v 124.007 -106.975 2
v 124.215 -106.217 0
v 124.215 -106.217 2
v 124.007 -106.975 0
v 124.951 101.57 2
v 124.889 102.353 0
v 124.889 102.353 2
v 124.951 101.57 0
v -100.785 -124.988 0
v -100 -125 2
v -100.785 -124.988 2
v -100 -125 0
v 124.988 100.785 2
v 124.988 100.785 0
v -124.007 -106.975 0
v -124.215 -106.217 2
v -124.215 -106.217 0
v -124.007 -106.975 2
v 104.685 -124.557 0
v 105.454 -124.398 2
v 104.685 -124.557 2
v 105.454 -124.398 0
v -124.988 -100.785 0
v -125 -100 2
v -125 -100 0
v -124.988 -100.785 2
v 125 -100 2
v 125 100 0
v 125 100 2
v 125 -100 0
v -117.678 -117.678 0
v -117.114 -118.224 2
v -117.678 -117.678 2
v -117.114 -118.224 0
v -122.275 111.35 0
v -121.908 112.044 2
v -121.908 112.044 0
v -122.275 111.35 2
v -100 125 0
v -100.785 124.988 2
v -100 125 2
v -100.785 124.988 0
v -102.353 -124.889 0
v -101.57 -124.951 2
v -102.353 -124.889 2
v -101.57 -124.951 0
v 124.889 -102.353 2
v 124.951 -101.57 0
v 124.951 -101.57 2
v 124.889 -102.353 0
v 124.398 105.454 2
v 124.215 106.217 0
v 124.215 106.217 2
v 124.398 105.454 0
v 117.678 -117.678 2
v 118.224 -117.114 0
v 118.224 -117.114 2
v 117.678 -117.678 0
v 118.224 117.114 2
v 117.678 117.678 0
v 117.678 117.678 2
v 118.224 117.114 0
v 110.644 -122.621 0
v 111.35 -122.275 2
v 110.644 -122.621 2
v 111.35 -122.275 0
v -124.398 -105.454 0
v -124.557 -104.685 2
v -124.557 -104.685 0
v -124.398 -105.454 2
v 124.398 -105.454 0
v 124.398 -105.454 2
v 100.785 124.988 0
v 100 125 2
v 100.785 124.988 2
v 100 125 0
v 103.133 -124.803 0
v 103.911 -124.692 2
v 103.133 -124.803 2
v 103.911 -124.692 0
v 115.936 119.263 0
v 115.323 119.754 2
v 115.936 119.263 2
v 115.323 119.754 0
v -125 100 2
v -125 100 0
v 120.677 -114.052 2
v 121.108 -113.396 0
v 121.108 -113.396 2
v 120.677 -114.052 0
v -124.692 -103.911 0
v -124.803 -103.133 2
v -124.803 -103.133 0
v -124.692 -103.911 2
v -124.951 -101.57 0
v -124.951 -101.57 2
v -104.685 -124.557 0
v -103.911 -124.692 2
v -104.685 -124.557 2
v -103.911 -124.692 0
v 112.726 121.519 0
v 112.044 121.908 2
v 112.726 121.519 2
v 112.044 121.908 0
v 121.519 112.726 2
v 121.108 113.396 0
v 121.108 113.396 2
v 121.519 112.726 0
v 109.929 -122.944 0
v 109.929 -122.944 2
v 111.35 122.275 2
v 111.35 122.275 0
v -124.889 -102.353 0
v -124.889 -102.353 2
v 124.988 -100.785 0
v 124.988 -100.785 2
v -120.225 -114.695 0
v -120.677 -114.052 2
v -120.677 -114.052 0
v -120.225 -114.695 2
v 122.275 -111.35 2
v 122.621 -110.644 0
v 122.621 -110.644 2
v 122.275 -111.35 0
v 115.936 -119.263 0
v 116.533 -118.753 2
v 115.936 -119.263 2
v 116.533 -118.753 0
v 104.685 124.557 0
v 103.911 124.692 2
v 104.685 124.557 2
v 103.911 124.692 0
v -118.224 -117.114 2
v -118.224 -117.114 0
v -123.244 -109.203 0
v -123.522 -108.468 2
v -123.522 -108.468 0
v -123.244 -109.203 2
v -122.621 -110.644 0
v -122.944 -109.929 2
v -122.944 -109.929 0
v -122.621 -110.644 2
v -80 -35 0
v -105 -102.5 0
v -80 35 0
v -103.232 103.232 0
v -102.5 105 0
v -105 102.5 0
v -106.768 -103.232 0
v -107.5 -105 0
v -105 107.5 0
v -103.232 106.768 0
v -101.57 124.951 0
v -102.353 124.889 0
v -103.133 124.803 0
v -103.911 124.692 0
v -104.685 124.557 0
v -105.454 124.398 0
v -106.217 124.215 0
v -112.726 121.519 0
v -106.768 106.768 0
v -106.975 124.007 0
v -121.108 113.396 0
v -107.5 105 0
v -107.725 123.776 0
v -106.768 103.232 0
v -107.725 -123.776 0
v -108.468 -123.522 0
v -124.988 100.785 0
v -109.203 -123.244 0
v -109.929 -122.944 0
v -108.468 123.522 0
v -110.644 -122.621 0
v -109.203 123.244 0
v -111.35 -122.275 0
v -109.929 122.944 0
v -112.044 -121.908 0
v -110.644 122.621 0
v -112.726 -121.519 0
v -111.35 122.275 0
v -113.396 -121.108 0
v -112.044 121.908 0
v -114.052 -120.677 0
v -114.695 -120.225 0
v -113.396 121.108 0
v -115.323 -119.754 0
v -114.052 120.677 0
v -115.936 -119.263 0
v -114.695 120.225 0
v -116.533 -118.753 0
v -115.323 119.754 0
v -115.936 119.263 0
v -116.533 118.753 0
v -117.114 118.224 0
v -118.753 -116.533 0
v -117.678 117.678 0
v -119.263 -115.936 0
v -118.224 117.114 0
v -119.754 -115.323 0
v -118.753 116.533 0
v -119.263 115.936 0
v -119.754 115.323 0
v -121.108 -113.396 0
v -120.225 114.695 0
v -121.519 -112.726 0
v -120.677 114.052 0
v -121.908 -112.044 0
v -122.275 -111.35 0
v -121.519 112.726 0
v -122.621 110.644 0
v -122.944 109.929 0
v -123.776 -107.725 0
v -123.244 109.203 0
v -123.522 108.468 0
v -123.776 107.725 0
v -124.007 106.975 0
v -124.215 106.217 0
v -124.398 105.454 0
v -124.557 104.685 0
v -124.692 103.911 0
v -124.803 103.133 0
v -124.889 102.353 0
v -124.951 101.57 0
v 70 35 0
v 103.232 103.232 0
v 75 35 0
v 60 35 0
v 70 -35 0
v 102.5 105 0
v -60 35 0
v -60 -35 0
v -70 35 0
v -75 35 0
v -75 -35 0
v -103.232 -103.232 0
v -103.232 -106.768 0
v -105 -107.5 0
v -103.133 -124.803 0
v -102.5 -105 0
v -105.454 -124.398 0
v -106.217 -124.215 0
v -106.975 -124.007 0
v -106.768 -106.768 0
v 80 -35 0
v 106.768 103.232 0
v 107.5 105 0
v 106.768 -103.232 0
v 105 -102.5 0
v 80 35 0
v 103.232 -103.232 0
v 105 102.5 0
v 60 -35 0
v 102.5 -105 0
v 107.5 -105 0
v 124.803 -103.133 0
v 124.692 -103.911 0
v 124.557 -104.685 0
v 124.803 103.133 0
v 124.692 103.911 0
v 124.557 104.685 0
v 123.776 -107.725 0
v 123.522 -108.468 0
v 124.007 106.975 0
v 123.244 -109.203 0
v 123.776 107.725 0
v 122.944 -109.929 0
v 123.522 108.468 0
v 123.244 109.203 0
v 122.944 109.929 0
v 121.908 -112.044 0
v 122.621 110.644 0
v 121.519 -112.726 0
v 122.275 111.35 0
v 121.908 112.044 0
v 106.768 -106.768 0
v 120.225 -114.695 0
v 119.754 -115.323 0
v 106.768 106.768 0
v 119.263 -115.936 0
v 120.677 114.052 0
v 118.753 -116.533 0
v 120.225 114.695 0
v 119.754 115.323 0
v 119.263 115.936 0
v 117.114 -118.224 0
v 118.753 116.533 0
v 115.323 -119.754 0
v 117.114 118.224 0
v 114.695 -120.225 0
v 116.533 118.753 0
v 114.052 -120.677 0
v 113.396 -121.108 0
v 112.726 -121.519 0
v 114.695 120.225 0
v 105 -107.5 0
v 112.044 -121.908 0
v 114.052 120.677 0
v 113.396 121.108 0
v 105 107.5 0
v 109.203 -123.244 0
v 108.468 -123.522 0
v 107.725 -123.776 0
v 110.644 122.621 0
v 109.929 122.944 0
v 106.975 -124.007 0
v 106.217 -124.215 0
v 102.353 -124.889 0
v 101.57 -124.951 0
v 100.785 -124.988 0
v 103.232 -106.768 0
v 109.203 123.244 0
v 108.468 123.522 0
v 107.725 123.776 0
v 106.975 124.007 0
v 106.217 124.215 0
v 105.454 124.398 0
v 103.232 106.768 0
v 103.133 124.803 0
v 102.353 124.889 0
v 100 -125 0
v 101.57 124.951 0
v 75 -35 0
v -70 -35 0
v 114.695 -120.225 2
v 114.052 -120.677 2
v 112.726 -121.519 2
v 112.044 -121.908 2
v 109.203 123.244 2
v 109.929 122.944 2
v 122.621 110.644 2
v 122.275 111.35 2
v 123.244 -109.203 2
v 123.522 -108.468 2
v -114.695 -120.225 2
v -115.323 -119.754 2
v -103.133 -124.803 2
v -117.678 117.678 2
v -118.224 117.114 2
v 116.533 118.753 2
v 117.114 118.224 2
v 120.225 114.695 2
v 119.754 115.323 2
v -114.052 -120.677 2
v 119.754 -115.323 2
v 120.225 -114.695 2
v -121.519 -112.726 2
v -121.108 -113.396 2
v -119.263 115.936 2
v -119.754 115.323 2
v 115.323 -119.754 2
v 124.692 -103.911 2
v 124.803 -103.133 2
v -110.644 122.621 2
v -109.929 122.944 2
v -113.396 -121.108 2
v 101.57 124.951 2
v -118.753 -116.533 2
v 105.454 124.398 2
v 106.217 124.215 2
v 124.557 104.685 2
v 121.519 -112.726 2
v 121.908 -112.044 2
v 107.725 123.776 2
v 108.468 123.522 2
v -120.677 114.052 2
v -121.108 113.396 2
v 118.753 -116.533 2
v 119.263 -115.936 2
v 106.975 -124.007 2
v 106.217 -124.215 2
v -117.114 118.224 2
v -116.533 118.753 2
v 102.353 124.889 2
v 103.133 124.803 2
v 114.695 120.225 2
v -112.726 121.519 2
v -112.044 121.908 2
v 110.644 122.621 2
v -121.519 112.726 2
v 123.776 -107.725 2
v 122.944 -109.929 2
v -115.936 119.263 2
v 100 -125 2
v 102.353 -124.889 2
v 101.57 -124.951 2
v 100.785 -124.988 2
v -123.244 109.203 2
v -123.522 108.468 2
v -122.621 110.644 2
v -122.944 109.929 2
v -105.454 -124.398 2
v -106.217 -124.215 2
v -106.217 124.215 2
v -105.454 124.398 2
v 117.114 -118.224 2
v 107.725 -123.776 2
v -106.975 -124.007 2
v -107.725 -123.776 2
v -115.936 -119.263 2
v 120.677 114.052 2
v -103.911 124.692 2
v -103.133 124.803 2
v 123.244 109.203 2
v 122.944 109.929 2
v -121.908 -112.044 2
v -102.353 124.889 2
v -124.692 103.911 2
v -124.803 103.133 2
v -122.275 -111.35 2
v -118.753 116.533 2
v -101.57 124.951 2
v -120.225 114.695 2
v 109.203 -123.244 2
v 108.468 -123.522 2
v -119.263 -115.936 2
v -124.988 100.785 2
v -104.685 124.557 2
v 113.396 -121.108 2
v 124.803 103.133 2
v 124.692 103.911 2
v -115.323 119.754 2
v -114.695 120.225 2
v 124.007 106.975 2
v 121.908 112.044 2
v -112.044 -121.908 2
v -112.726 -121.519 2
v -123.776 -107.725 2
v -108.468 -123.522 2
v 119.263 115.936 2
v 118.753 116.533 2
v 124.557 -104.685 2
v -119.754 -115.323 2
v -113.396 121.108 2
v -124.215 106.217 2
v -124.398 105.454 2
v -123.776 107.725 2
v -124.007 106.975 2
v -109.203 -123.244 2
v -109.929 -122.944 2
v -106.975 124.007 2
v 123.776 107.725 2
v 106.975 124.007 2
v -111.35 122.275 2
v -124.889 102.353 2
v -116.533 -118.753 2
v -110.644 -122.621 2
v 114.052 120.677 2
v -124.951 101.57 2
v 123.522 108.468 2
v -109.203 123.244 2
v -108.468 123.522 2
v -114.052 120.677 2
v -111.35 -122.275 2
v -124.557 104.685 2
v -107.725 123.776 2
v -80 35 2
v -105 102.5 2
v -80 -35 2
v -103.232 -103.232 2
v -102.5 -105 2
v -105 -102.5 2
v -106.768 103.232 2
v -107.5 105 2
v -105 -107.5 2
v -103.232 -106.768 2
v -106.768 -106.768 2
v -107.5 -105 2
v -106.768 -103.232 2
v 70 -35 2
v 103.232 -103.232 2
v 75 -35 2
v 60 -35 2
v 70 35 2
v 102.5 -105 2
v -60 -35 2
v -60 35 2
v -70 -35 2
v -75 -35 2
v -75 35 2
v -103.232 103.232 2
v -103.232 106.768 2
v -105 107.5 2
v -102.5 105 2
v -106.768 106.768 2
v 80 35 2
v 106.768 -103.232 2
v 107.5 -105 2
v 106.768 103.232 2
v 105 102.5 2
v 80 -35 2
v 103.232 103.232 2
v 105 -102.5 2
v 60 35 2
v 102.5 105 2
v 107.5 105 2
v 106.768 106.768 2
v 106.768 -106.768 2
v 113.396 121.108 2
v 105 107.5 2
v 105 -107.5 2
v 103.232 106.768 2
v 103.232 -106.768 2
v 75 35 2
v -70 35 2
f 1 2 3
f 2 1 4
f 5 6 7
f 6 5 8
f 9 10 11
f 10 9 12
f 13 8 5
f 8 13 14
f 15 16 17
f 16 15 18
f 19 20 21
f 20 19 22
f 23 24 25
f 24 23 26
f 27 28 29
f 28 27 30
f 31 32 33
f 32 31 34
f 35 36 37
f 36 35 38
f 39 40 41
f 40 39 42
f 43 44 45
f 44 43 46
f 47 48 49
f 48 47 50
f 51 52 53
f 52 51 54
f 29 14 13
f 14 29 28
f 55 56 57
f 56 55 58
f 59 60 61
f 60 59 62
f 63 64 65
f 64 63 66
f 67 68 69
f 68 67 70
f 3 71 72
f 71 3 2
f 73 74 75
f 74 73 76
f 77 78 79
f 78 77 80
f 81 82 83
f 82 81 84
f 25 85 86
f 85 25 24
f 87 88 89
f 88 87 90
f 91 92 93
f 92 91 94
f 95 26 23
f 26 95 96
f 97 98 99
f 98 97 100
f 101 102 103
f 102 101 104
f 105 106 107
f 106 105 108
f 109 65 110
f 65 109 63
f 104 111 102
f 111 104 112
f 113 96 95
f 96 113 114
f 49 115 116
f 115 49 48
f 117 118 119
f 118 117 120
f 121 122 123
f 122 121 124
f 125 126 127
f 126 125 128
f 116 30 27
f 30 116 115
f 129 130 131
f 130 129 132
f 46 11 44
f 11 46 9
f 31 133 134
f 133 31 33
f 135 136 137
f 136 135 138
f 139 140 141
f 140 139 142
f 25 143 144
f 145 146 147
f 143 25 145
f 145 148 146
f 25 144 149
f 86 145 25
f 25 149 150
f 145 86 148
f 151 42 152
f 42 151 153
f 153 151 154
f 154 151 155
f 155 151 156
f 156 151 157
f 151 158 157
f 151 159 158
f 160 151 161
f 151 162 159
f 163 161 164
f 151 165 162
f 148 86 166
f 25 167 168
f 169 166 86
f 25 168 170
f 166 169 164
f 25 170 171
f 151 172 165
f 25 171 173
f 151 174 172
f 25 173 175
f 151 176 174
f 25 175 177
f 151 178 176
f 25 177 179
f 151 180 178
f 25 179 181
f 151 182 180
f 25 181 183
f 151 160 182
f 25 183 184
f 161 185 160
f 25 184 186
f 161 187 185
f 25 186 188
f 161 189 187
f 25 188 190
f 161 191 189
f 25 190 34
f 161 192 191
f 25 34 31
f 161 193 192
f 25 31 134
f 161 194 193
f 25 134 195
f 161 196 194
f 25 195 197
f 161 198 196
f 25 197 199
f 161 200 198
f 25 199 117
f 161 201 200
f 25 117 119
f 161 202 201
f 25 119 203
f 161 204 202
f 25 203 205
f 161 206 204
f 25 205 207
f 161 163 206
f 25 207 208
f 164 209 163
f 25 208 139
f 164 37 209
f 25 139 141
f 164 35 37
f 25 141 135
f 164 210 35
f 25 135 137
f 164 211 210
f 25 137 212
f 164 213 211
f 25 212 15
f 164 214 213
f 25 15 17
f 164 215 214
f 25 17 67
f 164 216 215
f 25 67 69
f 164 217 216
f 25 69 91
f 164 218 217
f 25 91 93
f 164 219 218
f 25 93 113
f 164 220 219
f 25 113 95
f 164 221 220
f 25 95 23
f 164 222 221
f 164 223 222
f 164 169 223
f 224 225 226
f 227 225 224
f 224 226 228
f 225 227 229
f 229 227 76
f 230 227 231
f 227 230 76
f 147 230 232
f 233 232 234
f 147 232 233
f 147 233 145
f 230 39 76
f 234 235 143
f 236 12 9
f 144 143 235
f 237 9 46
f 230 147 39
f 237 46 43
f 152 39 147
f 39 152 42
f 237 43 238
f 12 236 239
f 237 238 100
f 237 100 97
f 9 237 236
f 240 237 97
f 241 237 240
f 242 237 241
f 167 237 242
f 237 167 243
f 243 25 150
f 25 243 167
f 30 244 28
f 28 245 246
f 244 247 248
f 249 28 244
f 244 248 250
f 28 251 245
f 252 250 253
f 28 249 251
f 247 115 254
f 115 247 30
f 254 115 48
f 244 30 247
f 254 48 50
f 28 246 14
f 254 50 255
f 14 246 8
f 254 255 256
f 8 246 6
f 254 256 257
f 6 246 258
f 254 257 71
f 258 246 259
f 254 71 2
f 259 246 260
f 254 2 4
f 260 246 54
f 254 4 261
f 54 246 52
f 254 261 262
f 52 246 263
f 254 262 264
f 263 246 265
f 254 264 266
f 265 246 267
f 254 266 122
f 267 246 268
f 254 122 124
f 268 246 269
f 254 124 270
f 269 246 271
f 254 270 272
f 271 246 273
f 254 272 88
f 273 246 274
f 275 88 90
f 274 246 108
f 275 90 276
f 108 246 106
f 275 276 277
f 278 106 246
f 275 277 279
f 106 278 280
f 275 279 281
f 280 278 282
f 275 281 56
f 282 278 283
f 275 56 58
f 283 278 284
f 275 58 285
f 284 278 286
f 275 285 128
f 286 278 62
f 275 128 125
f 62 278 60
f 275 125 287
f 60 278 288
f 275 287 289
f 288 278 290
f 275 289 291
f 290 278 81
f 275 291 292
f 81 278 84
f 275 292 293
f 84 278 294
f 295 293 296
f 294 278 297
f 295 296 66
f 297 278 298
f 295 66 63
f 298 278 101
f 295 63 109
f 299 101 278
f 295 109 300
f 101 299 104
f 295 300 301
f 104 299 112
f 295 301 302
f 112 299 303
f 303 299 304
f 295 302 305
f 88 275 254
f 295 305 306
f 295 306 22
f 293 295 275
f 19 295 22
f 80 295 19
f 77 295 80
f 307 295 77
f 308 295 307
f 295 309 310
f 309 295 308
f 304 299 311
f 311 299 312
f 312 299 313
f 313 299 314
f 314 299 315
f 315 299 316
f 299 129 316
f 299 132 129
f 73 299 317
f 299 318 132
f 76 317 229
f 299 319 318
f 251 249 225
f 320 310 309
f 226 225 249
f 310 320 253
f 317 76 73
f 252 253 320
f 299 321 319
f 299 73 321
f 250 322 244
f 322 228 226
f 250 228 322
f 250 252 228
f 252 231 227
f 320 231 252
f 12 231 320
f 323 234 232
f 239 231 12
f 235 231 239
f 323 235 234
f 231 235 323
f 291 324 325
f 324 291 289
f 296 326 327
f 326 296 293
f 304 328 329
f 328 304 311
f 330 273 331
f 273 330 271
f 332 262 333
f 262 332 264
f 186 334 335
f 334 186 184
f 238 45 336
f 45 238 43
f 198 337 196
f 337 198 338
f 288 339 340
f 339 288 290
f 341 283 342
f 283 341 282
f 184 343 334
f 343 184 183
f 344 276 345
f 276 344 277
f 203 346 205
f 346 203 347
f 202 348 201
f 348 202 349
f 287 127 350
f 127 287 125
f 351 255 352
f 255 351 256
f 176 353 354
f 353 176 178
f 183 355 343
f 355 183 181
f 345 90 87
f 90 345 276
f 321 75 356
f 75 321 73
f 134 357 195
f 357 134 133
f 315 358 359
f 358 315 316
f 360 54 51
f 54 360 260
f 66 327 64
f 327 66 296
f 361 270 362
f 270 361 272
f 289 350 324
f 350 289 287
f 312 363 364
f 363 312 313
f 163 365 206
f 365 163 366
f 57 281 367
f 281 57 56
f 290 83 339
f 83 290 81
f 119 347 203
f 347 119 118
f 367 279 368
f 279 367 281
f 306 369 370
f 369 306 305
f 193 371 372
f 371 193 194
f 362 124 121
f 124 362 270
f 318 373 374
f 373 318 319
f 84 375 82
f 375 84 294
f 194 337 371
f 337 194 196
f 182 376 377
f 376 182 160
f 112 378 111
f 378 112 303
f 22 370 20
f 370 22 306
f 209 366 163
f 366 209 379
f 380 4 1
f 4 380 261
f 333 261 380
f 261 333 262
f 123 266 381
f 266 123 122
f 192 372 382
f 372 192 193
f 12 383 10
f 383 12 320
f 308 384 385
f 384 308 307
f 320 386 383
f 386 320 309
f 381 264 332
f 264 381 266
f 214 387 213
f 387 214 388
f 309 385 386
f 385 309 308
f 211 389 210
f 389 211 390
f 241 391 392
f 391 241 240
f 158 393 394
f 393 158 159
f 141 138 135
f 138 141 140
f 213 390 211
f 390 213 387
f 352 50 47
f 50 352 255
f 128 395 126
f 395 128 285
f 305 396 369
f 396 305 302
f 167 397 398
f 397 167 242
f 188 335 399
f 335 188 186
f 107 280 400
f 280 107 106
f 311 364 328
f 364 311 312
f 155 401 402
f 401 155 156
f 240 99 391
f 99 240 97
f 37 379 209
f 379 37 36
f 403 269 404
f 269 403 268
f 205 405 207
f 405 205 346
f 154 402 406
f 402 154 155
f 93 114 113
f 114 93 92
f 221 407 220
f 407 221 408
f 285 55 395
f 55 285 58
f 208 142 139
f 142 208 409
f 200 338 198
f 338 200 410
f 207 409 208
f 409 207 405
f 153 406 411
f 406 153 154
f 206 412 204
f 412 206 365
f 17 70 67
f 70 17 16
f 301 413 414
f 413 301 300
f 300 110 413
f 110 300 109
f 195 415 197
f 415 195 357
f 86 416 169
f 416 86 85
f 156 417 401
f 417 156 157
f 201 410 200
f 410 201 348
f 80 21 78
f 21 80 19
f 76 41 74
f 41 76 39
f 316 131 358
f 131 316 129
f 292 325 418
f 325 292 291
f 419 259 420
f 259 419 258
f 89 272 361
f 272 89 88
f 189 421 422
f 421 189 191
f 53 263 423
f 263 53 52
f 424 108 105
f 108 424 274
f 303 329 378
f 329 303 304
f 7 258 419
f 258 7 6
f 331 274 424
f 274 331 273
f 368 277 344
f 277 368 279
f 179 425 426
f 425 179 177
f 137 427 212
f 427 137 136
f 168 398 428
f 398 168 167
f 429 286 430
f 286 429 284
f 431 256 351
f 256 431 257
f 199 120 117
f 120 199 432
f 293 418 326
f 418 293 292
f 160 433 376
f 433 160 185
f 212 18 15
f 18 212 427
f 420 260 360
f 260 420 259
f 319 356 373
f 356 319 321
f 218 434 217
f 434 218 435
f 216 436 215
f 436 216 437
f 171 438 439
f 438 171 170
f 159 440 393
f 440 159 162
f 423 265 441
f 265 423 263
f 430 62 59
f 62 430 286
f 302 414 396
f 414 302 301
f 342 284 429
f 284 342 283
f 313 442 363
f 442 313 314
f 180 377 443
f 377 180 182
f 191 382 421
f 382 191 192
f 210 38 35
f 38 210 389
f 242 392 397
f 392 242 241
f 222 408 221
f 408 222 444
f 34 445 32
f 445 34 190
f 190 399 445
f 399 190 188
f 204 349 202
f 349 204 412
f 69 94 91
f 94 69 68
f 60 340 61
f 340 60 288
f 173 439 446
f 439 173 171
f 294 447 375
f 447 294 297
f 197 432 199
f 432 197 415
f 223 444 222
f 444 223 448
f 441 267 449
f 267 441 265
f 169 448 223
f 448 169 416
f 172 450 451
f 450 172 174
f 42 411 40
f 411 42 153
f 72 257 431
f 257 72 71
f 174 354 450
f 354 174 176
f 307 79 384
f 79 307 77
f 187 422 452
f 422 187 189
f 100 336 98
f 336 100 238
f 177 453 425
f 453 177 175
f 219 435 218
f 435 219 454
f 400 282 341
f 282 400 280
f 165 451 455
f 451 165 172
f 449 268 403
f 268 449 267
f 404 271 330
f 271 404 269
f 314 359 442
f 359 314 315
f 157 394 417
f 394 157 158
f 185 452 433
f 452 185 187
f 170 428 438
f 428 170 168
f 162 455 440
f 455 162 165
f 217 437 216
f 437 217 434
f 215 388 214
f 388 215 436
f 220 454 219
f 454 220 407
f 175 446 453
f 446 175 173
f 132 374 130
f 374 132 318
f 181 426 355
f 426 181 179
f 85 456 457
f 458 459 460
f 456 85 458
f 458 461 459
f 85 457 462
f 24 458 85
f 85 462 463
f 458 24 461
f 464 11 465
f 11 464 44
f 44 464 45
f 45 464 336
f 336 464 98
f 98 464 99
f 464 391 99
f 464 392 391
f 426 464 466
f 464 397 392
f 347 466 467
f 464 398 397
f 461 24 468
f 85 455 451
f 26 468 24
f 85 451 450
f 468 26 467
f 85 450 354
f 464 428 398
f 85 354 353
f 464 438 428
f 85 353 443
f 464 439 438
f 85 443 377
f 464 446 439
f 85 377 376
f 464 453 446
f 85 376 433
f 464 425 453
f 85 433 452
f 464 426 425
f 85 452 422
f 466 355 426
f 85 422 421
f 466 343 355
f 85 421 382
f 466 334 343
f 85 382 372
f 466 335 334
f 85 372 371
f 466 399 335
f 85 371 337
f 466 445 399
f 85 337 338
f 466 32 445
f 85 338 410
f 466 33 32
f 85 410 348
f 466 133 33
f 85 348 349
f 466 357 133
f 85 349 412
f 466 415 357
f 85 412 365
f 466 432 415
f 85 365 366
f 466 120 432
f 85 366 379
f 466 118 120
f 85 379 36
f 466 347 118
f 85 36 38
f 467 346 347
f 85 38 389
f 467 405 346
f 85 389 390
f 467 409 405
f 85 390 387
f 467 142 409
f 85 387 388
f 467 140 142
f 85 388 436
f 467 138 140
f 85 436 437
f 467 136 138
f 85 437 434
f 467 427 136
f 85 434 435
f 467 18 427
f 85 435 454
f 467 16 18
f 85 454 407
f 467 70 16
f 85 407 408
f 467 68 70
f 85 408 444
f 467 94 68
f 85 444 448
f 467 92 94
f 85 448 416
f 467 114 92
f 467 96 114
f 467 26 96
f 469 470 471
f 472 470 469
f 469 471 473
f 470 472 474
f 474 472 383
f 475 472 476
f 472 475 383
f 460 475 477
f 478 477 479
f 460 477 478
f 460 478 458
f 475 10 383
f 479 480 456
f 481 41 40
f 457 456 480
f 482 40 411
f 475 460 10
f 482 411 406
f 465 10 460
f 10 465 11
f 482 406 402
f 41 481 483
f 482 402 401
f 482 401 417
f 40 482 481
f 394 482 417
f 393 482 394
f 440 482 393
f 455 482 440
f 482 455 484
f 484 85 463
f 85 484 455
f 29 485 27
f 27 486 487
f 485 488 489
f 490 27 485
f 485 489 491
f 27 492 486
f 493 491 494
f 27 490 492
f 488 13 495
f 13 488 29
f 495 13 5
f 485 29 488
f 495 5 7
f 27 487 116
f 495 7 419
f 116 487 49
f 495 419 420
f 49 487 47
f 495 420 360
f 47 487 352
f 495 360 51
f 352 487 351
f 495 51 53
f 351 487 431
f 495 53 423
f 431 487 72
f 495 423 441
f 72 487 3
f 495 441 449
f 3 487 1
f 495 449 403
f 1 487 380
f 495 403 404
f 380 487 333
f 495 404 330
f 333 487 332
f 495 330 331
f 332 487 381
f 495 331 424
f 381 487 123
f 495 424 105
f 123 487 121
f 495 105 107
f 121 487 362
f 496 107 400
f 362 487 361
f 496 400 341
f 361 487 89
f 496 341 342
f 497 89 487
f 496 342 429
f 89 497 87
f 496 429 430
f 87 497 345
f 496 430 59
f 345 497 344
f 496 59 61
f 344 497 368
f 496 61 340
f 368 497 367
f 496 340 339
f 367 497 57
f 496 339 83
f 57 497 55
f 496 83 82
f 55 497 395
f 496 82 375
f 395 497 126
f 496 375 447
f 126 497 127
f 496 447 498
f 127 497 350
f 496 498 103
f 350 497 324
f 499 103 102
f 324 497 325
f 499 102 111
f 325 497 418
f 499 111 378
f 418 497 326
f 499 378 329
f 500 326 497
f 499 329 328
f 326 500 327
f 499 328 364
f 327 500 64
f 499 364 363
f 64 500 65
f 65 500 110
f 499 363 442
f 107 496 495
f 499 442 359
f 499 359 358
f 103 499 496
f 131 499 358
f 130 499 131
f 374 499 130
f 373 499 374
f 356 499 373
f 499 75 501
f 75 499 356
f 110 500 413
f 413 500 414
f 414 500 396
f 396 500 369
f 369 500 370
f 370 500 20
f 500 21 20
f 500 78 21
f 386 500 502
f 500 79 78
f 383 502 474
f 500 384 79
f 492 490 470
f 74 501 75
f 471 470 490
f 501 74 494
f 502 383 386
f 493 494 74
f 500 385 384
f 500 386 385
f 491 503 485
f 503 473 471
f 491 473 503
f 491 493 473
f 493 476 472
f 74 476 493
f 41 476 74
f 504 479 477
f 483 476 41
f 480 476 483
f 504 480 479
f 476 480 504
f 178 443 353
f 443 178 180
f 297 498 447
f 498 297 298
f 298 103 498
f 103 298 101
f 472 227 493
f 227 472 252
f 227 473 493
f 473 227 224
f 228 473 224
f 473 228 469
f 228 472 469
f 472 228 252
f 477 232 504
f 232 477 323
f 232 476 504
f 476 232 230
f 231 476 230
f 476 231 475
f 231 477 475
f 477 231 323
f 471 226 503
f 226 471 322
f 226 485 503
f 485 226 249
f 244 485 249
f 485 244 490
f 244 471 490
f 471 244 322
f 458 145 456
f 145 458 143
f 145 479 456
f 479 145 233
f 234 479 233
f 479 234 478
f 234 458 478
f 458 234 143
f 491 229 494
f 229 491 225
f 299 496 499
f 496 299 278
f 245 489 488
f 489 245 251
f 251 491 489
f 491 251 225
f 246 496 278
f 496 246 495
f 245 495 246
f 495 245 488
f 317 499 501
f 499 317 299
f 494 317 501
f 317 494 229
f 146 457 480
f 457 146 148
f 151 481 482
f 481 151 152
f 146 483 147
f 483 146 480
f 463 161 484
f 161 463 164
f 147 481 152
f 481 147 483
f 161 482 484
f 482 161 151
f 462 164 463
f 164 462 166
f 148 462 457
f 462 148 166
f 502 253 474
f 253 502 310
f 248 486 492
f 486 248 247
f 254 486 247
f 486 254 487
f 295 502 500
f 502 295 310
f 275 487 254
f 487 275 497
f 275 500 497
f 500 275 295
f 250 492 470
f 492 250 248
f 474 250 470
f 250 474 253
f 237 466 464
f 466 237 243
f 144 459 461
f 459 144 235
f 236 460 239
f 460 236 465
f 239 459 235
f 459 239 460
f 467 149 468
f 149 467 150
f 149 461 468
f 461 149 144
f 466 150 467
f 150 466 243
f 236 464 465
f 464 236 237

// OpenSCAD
difference() {
    color("grey") linear_extrude(2,true) //épaisseur à revoir
        minkowski() {
            square(size =  200    , center = true);
            circle(d=50,$fn=200);
        }
    translate([65, 0, -1]) linear_extrude(4,true) square(size = [10, 70], center = true);
    translate([-65, 0, -1]) linear_extrude(4,true) square(size = [10, 70], center = true);
    translate([77.5, 0, -1]) linear_extrude(4,true) square(size = [5, 70], center = true);
    translate([-77.5, 0, -1]) linear_extrude(4,true) square(size = [5, 70], center = true);

//Trous
    translate([105, 105, -2]) linear_extrude(8, true) circle(d=5, true);
    translate([-105, 105, -2]) linear_extrude(8, true) circle(d=5, true);
    translate([105, -105, -2]) linear_extrude(8, true) circle(d=5, true);
    translate([-105, -105, -2]) linear_extrude(8, true) circle(d=5, true);
}
